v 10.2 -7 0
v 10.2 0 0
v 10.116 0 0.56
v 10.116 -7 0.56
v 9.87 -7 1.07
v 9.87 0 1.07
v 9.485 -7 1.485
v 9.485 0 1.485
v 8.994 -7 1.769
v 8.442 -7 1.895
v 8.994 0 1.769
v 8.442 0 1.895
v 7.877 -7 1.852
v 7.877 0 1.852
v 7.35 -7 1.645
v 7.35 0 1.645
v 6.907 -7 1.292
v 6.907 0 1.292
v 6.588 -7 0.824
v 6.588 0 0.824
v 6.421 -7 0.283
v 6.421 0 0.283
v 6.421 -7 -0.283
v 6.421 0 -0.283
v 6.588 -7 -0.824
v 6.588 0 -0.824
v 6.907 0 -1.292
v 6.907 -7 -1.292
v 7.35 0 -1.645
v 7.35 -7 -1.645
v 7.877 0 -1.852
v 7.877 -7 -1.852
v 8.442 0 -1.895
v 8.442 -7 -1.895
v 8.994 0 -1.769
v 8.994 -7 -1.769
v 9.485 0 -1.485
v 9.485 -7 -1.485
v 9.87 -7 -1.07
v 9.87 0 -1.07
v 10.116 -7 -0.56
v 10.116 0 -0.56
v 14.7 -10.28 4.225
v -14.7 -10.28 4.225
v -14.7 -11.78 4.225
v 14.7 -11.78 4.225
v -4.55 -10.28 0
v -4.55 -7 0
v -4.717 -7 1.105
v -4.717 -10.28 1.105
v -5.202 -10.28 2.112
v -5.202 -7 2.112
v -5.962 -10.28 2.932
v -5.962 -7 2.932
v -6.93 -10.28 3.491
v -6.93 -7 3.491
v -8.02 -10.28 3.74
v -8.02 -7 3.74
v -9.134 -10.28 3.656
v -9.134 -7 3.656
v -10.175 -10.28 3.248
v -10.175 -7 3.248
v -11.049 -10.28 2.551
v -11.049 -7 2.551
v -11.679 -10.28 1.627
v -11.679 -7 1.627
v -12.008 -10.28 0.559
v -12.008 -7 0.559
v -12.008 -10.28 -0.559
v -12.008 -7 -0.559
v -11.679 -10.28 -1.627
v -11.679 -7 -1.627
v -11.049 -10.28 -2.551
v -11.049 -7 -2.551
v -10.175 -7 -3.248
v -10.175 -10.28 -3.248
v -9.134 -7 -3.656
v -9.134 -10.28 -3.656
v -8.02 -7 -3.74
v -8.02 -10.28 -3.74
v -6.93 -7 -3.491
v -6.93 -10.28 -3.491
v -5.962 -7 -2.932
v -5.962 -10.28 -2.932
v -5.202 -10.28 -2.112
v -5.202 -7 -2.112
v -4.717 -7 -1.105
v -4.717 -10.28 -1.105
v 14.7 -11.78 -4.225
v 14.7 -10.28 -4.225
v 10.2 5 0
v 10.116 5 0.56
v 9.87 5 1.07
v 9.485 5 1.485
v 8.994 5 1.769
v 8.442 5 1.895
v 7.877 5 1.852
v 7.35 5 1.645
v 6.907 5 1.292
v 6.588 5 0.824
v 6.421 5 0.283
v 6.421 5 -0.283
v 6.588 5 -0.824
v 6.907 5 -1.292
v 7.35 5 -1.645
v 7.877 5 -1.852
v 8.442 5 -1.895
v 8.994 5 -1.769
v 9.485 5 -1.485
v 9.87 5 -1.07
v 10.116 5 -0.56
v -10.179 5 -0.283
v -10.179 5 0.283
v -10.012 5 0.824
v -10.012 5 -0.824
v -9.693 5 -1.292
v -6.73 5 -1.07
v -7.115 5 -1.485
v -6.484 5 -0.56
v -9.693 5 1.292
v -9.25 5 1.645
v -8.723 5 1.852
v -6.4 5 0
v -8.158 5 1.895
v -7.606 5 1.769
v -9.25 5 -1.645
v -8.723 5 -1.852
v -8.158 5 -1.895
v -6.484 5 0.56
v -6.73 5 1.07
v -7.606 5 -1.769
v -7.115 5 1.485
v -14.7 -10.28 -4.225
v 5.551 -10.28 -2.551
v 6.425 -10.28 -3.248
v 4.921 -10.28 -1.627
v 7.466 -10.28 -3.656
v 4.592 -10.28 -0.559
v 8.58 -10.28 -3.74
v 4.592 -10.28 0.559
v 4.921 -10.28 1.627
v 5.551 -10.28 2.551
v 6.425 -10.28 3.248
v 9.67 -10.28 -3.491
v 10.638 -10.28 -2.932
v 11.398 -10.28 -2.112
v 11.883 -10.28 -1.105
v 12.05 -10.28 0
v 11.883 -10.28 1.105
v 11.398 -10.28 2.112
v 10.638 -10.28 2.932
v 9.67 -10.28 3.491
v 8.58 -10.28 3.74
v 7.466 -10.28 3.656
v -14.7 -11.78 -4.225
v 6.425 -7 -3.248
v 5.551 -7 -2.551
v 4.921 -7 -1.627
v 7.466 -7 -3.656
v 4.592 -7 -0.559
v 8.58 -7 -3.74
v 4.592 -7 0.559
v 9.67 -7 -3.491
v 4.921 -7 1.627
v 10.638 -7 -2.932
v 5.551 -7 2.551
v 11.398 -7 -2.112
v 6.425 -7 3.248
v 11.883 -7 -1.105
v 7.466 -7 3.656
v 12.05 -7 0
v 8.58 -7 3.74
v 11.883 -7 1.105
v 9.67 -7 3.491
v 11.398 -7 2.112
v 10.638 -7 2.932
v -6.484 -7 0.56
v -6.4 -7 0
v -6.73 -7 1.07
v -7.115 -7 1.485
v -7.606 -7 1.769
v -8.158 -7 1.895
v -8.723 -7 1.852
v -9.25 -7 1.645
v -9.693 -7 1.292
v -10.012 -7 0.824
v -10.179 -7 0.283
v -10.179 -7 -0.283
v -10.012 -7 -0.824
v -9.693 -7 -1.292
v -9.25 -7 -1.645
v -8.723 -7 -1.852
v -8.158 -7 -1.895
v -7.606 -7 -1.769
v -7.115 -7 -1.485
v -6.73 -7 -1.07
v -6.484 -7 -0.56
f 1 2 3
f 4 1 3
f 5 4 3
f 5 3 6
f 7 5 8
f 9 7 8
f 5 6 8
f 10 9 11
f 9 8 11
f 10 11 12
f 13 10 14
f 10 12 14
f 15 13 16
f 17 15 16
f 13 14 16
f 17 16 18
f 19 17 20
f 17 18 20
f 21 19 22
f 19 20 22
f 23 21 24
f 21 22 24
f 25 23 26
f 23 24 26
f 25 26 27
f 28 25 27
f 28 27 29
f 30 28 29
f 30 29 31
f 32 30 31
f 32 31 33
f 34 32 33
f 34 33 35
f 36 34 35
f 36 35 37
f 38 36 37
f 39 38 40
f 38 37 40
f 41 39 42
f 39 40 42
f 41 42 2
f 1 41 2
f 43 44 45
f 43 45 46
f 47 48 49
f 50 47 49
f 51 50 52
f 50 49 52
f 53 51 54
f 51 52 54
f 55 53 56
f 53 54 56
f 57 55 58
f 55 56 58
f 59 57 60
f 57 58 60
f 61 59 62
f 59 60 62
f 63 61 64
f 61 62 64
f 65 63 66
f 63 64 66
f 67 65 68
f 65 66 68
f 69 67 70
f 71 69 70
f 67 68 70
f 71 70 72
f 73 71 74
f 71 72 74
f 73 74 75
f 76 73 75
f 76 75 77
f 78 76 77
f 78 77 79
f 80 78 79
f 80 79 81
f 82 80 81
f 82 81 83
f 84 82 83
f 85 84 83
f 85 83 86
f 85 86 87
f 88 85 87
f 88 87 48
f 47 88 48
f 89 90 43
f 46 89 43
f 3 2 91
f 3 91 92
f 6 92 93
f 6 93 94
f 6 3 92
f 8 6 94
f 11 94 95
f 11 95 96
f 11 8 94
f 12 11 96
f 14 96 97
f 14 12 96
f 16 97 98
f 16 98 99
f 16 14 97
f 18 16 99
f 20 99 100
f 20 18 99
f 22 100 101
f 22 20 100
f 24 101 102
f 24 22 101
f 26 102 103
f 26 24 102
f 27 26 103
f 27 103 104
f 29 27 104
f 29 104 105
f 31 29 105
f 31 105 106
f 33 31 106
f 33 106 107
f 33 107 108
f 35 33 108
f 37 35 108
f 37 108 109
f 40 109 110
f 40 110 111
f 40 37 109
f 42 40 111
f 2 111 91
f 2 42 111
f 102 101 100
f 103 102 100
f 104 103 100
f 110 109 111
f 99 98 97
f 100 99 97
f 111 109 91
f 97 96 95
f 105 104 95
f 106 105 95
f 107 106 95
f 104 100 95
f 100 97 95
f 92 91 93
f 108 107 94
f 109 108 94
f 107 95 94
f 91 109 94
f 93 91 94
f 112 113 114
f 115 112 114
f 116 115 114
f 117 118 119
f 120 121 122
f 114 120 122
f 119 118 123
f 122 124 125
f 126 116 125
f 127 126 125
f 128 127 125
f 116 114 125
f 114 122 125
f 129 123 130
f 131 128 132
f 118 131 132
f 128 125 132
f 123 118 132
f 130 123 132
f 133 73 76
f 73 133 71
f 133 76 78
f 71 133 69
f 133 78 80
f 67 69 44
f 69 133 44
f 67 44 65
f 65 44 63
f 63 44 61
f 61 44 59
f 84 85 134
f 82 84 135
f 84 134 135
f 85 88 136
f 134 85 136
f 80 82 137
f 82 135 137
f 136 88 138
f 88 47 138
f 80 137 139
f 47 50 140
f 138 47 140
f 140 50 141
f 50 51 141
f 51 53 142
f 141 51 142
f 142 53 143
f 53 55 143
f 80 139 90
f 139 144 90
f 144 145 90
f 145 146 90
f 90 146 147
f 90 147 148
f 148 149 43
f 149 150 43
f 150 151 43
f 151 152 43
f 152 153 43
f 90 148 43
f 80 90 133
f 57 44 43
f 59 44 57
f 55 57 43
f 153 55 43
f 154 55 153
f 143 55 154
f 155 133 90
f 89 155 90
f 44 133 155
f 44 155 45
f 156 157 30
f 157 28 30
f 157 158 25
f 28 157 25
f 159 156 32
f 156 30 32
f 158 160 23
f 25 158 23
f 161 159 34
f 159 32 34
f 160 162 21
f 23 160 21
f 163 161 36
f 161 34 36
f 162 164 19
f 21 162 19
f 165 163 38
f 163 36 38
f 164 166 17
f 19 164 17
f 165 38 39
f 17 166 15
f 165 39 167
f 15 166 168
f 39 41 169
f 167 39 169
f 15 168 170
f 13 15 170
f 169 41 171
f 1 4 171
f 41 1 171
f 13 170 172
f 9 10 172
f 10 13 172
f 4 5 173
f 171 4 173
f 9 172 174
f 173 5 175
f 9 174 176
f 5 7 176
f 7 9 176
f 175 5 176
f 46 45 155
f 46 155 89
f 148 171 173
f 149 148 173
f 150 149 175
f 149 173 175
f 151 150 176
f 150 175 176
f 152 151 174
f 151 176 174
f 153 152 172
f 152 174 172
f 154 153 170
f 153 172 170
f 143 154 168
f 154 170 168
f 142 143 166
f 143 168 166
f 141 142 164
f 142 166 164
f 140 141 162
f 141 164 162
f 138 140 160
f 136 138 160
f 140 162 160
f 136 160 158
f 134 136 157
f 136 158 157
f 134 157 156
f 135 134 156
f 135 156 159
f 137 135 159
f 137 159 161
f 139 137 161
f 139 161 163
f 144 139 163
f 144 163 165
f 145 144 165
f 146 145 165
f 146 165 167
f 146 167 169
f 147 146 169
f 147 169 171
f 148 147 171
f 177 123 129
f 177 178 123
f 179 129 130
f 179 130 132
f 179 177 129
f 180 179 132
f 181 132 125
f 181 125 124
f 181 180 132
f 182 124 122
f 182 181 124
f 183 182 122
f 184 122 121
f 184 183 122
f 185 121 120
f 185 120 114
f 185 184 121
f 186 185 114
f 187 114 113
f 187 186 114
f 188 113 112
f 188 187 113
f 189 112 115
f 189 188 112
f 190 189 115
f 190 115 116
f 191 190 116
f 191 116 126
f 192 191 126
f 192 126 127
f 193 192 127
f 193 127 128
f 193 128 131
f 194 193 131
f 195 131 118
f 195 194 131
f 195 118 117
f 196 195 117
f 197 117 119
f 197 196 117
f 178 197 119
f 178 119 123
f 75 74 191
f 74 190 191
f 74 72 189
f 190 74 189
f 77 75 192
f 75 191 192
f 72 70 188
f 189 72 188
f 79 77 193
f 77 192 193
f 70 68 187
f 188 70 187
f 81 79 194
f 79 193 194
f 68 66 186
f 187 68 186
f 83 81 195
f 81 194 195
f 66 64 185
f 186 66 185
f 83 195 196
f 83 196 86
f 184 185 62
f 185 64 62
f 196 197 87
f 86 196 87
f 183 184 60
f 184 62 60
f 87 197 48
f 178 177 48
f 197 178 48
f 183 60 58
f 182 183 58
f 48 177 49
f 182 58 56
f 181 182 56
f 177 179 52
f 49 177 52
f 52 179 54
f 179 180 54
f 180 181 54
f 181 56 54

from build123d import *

# Parameters (mm, degrees)
F0_W     = 29.399694
F0_H     = 8.449018
F0_R     = 3.75
F0_R_2   = 1.9
F1_DEPTH = 11.78
F2_DEPTH = 10.28
F3_DEPTH = 7
F4_DEPTH = 5


with BuildPart() as f1:
    # F0 (on Front) → F1 (new body)
    with BuildSketch(Plane.XZ):
        Rectangle(F0_W, F0_H)
        with Locations((-8.3, 0)):
            Circle(F0_R, mode=Mode.SUBTRACT)
        with Locations((8.3, 0)):
            Circle(F0_R, mode=Mode.SUBTRACT)
        with Locations((-8.3, 0)):
            Circle(F0_R)
        with Locations((-8.3, 0)):
            Circle(F0_R_2, mode=Mode.SUBTRACT)
        with Locations((-8.3, 0)):
            Circle(F0_R_2)
        with Locations((8.3, 0)):
            Circle(F0_R)
        with Locations((8.3, 0)):
            Circle(F0_R_2, mode=Mode.SUBTRACT)
        with Locations((8.3, 0)):
            Circle(F0_R_2)
    extrude(amount=F1_DEPTH)

    # F0 (on Front) → F2 (cut)
    with BuildSketch(Plane.XZ):
        Rectangle(F0_W, F0_H)
        with Locations((-8.3, 0)):
            Circle(F0_R, mode=Mode.SUBTRACT)
        with Locations((8.3, 0)):
            Circle(F0_R, mode=Mode.SUBTRACT)
    extrude(amount=F2_DEPTH, mode=Mode.SUBTRACT)

    # F0 (on Front) → F3 (cut)
    with BuildSketch(Plane.XZ):
        with Locations((-8.3, 0)):
            Circle(F0_R)
        with Locations((-8.3, 0)):
            Circle(F0_R_2, mode=Mode.SUBTRACT)
        with Locations((8.3, 0)):
            Circle(F0_R)
        with Locations((8.3, 0)):
            Circle(F0_R_2, mode=Mode.SUBTRACT)
    extrude(amount=F3_DEPTH, mode=Mode.SUBTRACT)

    # F0 (on Front) → F4 (join)
    with BuildSketch(Plane.XZ):
        with Locations((-8.3, 0)):
            Circle(F0_R_2)
        with Locations((8.3, 0)):
            Circle(F0_R_2)
    extrude(amount=-F4_DEPTH)


solid = f1.part
